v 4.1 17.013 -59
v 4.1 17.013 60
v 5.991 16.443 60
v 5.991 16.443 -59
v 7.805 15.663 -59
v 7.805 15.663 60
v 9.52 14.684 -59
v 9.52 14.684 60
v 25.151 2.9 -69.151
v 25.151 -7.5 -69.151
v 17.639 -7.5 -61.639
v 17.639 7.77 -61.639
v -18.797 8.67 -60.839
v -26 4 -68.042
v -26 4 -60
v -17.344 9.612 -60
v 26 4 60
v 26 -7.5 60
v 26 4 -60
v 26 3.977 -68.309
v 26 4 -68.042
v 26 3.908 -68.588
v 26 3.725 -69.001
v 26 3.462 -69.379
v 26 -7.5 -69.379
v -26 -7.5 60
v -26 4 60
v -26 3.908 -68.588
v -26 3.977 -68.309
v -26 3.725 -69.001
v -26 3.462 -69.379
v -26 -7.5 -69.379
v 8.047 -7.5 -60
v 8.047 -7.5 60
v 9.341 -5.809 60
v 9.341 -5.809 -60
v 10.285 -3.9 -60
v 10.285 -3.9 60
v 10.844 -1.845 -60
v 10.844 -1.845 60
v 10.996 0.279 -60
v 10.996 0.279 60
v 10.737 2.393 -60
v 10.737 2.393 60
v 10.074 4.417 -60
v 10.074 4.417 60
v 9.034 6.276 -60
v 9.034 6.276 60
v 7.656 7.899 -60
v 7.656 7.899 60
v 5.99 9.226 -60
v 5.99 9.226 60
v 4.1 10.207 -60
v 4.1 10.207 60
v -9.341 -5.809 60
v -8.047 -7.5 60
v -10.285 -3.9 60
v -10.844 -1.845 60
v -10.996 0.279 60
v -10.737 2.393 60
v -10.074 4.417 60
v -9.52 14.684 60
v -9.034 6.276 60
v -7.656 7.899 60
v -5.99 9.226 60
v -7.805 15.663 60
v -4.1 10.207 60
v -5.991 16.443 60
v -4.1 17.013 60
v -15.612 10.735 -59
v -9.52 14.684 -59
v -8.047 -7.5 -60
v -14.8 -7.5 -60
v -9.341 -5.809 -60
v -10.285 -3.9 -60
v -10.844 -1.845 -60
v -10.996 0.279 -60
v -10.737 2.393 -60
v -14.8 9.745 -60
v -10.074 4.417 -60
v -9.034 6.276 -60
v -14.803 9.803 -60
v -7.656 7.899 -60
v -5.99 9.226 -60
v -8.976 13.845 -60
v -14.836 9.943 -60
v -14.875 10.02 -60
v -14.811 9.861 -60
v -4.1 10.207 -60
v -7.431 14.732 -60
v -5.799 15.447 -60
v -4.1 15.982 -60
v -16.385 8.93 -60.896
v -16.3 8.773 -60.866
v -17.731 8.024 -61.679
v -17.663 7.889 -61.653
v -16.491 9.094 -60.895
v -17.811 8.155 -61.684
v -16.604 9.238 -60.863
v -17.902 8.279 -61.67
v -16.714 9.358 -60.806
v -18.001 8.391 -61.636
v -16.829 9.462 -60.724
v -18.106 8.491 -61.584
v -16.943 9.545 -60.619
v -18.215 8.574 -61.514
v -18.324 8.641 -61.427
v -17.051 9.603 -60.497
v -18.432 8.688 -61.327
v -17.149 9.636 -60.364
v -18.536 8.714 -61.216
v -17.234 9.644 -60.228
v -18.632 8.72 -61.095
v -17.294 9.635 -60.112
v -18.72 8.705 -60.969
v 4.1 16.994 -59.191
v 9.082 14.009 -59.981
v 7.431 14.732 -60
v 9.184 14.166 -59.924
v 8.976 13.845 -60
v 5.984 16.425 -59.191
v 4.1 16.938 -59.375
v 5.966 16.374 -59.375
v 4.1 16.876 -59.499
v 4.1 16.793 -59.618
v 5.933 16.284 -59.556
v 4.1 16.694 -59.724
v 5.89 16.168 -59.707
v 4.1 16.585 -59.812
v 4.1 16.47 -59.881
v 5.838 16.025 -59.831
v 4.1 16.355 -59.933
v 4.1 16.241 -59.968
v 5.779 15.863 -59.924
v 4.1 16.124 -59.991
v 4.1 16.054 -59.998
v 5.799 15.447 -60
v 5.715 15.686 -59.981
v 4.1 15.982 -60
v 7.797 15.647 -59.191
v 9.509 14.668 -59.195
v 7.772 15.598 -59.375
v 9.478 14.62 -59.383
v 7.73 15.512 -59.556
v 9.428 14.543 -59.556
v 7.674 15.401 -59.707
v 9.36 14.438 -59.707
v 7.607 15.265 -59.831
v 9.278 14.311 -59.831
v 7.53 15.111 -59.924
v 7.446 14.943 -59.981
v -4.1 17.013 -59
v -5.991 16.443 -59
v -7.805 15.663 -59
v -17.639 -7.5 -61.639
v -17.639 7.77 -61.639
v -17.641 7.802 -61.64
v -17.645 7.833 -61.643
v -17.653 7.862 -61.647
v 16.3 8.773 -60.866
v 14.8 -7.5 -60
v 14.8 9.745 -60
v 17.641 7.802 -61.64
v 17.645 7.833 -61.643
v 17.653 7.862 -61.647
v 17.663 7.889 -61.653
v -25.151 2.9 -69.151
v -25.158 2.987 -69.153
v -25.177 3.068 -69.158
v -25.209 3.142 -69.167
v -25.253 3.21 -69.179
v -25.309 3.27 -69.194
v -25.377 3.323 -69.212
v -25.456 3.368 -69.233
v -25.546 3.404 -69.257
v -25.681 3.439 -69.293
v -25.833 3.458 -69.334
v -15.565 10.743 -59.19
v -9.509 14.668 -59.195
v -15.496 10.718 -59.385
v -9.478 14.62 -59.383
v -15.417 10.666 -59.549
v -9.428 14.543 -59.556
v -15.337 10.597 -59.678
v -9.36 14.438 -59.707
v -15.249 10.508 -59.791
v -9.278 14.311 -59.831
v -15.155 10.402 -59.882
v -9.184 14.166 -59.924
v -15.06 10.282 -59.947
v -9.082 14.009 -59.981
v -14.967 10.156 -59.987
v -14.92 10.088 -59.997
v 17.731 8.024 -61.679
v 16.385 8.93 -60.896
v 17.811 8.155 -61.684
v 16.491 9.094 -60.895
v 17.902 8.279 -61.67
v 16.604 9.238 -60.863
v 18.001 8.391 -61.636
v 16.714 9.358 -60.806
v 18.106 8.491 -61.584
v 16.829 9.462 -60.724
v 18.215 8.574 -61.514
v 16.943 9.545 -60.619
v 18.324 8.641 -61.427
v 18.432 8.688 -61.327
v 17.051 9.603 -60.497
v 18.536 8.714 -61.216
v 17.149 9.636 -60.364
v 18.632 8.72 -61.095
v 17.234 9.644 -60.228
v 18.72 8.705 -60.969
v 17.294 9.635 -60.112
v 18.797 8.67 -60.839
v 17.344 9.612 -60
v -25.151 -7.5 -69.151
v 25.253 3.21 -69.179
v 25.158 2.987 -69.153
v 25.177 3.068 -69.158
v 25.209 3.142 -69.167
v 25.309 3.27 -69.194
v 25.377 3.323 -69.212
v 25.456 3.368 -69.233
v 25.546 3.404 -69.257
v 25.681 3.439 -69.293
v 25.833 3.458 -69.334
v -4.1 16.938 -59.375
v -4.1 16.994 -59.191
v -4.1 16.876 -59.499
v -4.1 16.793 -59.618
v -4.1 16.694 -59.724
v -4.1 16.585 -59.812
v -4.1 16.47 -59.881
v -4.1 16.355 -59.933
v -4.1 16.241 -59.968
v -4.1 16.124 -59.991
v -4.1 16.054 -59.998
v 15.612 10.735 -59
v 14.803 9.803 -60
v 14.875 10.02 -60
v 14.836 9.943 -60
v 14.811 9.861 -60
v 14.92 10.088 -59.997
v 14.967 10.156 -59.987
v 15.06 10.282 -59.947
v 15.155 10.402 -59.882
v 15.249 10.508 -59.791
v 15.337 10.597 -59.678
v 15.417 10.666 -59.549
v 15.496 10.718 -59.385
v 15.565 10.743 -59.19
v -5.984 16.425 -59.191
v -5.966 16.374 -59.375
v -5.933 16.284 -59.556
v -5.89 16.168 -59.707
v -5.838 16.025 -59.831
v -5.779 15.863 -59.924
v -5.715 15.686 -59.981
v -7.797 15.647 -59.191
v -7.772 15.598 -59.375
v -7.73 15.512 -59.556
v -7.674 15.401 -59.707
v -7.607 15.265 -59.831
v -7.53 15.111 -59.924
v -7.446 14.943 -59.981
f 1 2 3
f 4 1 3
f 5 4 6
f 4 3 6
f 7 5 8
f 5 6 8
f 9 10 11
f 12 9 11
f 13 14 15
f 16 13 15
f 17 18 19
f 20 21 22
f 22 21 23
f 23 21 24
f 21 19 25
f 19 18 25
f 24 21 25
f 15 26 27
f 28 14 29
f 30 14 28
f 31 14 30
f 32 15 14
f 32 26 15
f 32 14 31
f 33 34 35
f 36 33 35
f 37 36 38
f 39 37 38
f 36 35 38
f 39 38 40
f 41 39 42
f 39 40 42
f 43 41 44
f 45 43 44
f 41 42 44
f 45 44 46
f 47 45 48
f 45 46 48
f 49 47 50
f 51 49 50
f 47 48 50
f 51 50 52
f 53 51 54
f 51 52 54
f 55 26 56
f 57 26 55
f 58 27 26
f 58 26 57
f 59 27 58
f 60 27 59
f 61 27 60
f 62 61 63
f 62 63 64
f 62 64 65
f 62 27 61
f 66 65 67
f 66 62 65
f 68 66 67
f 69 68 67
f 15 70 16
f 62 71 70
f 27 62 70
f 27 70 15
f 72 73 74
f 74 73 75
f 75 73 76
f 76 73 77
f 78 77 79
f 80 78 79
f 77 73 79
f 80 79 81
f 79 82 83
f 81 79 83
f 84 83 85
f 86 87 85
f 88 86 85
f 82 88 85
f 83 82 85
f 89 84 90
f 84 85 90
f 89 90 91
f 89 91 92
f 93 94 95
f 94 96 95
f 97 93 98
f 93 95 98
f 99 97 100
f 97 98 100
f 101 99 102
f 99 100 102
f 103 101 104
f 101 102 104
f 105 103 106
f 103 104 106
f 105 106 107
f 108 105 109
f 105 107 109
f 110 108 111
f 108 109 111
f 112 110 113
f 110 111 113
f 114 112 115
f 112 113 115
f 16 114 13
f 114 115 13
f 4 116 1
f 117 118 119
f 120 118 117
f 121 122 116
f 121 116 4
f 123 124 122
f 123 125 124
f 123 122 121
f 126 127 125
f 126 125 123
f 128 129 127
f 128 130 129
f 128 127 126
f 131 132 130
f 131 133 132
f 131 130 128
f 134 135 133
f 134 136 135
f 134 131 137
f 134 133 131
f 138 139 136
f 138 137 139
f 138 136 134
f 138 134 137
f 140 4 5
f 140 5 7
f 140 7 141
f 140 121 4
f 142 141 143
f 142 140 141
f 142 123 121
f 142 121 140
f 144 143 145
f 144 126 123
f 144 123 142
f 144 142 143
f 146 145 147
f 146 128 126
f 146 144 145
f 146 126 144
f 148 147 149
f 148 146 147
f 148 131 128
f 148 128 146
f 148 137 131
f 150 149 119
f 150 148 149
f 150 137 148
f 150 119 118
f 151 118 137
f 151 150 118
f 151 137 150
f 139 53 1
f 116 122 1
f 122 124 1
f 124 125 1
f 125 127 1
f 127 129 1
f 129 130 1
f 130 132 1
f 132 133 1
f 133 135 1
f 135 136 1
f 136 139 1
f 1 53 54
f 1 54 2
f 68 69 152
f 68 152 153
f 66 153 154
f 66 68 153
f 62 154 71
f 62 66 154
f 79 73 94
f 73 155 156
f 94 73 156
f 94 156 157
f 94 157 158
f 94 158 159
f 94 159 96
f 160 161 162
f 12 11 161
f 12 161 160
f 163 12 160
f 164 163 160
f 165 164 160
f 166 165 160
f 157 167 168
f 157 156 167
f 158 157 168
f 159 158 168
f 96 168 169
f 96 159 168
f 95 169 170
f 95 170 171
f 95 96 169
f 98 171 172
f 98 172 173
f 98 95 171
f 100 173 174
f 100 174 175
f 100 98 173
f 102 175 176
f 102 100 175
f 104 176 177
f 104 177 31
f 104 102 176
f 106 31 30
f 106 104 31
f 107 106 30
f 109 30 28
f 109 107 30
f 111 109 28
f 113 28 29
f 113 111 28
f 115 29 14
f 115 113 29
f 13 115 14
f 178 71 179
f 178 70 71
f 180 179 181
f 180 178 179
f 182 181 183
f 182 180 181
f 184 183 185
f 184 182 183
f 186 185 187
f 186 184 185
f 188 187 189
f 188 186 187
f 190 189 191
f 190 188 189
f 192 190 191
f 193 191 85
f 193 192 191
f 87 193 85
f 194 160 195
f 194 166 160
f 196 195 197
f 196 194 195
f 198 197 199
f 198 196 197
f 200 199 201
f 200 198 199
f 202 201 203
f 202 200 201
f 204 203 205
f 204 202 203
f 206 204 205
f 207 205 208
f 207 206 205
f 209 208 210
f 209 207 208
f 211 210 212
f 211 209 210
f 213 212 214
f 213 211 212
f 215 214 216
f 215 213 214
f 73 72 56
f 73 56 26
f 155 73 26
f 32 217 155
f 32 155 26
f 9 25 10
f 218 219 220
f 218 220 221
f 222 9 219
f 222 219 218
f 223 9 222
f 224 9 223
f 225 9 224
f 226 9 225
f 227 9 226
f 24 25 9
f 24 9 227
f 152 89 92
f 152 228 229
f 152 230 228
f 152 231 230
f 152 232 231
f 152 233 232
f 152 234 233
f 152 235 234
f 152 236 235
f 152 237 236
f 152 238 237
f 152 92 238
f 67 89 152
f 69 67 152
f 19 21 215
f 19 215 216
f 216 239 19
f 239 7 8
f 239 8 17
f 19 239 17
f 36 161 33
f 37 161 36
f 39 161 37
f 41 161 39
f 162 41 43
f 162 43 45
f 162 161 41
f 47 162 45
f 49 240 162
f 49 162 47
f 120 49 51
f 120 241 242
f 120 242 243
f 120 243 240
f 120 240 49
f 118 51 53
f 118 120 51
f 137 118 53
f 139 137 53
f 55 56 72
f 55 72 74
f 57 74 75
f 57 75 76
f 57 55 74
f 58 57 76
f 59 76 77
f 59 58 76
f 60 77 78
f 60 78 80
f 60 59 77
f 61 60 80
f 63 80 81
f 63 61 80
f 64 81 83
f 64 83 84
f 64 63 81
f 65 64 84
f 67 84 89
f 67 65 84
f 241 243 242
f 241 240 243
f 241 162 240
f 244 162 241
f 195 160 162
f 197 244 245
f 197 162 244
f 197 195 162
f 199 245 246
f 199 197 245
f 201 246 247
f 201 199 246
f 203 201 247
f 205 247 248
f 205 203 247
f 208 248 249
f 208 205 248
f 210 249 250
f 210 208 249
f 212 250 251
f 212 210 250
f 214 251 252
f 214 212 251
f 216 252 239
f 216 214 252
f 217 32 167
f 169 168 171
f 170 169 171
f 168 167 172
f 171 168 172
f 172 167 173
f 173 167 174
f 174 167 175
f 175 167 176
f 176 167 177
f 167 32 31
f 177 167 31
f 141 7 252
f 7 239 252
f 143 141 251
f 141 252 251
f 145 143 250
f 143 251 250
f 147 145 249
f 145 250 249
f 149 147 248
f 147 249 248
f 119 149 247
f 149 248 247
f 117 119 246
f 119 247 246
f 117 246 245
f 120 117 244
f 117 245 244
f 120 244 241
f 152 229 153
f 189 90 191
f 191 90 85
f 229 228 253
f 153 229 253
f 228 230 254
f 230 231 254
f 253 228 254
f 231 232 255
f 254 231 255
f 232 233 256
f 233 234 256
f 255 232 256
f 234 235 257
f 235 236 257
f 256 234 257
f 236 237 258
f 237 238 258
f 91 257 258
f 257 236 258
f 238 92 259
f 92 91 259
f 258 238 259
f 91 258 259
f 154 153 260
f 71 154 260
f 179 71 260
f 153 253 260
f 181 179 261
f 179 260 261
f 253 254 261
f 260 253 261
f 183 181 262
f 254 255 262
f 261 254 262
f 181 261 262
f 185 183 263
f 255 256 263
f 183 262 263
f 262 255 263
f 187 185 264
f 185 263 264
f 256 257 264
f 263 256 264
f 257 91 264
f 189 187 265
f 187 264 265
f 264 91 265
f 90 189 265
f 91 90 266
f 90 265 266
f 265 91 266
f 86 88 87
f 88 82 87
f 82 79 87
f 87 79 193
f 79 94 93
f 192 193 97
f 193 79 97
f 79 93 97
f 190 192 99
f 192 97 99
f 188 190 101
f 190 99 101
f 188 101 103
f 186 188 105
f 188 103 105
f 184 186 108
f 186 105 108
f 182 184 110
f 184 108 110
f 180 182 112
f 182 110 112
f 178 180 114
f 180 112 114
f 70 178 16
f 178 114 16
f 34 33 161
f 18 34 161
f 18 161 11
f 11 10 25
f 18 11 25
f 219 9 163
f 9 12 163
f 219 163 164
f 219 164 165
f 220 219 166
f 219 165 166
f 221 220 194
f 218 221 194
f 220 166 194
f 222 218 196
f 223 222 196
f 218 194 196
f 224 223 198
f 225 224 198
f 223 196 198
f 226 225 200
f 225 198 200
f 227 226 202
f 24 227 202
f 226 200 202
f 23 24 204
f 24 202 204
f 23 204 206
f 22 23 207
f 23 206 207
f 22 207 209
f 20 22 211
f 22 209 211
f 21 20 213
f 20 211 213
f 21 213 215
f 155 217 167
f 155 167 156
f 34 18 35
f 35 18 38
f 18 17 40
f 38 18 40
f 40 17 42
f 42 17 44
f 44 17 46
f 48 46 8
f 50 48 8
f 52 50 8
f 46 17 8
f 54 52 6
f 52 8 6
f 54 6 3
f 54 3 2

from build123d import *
from OCP.BRepFilletAPI import BRepFilletAPI_MakeChamfer

# Parameters (mm, degrees)
EXTRUDE_1_DEPTH          = 60
EXTRUDE_2_DEPTH          = 11
EXTRUDE_2_DEPTH_BACK     = 7.5
CUT_EXTRUDE_1_DEPTH      = 77.58616063
CUT_EXTRUDE_1_DEPTH_BACK = 77.58616063
CHAMFER_1_SIZE           = 1.2
CHAMFER_1_SIZE2          = 2.318221983
CHAMFER_1_SIZE2_2        = 0.621165708
FILLET_1_R               = 1


with BuildPart() as part:
    # 스케치1 → 보스-돌출1 (new, symmetric)
    with BuildSketch(Plane.XY):
        with BuildLine():
            Line((-26, -7.5), (-15.811388301, -7.5))
            ThreePointArc((-15.811388301, -7.5), (-16.835996569, 4.774852829), (-9.519745153, 14.684156503))
            Line((-9.519745153, 14.684156503), (-26, 4))
            Line((-26, 4), (-26, -7.5))
        make_face()
        with BuildLine():
            ThreePointArc((-9.519745153, 14.684156503), (-16.835996569, 4.774852829), (-15.811388301, -7.5))
            Line((-15.811388301, -7.5), (-8.04673847, -7.5))
            ThreePointArc((-8.04673847, -7.5), (-10.736544018, 2.393036259), (-4.1, 10.207350293))
            Line((-4.1, 10.207350293), (-4.1, 17.012936255))
            ThreePointArc((-4.1, 17.012936255), (-6.90870236, 16.078551916), (-9.519745153, 14.684156503))
        make_face()
    extrude(amount=EXTRUDE_1_DEPTH, both=True)

    # 스케치2 → 보스-돌출2 (add, two sides: drawn at the far end of the back side and taken through both)
    with BuildSketch(Plane(origin=(0, 0, 0), x_dir=(1, 0, 0), z_dir=(0, 1, 0)).offset(-EXTRUDE_2_DEPTH_BACK)):
        Polygon((-26, 60), (-26, 70), (-16, 60), align=None)
    extrude(amount=EXTRUDE_2_DEPTH + EXTRUDE_2_DEPTH_BACK)

    # 스케치3 → 컷-돌출1 (cut, two sides: drawn at the far end of the back side and taken through both)
    with BuildSketch(Plane.XY.offset(-CUT_EXTRUDE_1_DEPTH_BACK)):
        Polygon((-26, 4), (-15.202537057, 11), (-26, 11), align=None)
    extrude(amount=CUT_EXTRUDE_1_DEPTH + CUT_EXTRUDE_1_DEPTH_BACK, mode=Mode.SUBTRACT)

    # 모따기1: one chamfer whose edges measure the first distance from different faces: ONE call of the kernel's chamfer builder (chamfer() names one face for all edges)
    chamfer_1_edges_1 = [part.edges().sort_by_distance(p)[0] for p in [
        (-16, 1.491502211, -60),
    ]]
    chamfer_1_side_1 = [part.faces().sort_by_distance(p)[0] for p in [
        (-11.32981626, 5.117453967, -60),
    ]]
    chamfer_1_edges_2 = [part.edges().sort_by_distance(p)[0] for p in [
        (-26, -1.75, -70),
    ]]
    chamfer_1_side_2 = [part.faces().sort_by_distance(p)[0] for p in [
        (-20.633517425, -0.010453487, -64.633517425),
    ]]
    chamfer_1 = BRepFilletAPI_MakeChamfer(part.part.solid().wrapped)
    for e in chamfer_1_edges_1:
        chamfer_1.Add(CHAMFER_1_SIZE, CHAMFER_1_SIZE2, e.wrapped, chamfer_1_side_1[0].wrapped)  # the first distance lies on this face
    for e in chamfer_1_edges_2:
        chamfer_1.Add(CHAMFER_1_SIZE, CHAMFER_1_SIZE2_2, e.wrapped, chamfer_1_side_2[0].wrapped)  # the first distance lies on this face
    add(Compound.cast(chamfer_1.Shape()), mode=Mode.REPLACE)

    # 필렛1
    fillet_1_edges = [part.edges().sort_by_distance(p)[0] for p in [
        (-12.159872577, 12.972560728, -60),
        (-21.395351174, 6.98519587, -65.395351174),
        (-16.219615242, 10.340627763, -60.819615242),
        (-6.90870236, 16.078551916, -60),
    ]]
    fillet(fillet_1_edges, radius=FILLET_1_R)


with BuildPart() as body_2:
    # 대칭 복사5: mirrored copy
    add(part.part.mirror(Plane(origin=(0, 0, 0), x_dir=(0, 0, 1), z_dir=(1, 0, 0))))


solid = Compound([part.part, body_2.part])
